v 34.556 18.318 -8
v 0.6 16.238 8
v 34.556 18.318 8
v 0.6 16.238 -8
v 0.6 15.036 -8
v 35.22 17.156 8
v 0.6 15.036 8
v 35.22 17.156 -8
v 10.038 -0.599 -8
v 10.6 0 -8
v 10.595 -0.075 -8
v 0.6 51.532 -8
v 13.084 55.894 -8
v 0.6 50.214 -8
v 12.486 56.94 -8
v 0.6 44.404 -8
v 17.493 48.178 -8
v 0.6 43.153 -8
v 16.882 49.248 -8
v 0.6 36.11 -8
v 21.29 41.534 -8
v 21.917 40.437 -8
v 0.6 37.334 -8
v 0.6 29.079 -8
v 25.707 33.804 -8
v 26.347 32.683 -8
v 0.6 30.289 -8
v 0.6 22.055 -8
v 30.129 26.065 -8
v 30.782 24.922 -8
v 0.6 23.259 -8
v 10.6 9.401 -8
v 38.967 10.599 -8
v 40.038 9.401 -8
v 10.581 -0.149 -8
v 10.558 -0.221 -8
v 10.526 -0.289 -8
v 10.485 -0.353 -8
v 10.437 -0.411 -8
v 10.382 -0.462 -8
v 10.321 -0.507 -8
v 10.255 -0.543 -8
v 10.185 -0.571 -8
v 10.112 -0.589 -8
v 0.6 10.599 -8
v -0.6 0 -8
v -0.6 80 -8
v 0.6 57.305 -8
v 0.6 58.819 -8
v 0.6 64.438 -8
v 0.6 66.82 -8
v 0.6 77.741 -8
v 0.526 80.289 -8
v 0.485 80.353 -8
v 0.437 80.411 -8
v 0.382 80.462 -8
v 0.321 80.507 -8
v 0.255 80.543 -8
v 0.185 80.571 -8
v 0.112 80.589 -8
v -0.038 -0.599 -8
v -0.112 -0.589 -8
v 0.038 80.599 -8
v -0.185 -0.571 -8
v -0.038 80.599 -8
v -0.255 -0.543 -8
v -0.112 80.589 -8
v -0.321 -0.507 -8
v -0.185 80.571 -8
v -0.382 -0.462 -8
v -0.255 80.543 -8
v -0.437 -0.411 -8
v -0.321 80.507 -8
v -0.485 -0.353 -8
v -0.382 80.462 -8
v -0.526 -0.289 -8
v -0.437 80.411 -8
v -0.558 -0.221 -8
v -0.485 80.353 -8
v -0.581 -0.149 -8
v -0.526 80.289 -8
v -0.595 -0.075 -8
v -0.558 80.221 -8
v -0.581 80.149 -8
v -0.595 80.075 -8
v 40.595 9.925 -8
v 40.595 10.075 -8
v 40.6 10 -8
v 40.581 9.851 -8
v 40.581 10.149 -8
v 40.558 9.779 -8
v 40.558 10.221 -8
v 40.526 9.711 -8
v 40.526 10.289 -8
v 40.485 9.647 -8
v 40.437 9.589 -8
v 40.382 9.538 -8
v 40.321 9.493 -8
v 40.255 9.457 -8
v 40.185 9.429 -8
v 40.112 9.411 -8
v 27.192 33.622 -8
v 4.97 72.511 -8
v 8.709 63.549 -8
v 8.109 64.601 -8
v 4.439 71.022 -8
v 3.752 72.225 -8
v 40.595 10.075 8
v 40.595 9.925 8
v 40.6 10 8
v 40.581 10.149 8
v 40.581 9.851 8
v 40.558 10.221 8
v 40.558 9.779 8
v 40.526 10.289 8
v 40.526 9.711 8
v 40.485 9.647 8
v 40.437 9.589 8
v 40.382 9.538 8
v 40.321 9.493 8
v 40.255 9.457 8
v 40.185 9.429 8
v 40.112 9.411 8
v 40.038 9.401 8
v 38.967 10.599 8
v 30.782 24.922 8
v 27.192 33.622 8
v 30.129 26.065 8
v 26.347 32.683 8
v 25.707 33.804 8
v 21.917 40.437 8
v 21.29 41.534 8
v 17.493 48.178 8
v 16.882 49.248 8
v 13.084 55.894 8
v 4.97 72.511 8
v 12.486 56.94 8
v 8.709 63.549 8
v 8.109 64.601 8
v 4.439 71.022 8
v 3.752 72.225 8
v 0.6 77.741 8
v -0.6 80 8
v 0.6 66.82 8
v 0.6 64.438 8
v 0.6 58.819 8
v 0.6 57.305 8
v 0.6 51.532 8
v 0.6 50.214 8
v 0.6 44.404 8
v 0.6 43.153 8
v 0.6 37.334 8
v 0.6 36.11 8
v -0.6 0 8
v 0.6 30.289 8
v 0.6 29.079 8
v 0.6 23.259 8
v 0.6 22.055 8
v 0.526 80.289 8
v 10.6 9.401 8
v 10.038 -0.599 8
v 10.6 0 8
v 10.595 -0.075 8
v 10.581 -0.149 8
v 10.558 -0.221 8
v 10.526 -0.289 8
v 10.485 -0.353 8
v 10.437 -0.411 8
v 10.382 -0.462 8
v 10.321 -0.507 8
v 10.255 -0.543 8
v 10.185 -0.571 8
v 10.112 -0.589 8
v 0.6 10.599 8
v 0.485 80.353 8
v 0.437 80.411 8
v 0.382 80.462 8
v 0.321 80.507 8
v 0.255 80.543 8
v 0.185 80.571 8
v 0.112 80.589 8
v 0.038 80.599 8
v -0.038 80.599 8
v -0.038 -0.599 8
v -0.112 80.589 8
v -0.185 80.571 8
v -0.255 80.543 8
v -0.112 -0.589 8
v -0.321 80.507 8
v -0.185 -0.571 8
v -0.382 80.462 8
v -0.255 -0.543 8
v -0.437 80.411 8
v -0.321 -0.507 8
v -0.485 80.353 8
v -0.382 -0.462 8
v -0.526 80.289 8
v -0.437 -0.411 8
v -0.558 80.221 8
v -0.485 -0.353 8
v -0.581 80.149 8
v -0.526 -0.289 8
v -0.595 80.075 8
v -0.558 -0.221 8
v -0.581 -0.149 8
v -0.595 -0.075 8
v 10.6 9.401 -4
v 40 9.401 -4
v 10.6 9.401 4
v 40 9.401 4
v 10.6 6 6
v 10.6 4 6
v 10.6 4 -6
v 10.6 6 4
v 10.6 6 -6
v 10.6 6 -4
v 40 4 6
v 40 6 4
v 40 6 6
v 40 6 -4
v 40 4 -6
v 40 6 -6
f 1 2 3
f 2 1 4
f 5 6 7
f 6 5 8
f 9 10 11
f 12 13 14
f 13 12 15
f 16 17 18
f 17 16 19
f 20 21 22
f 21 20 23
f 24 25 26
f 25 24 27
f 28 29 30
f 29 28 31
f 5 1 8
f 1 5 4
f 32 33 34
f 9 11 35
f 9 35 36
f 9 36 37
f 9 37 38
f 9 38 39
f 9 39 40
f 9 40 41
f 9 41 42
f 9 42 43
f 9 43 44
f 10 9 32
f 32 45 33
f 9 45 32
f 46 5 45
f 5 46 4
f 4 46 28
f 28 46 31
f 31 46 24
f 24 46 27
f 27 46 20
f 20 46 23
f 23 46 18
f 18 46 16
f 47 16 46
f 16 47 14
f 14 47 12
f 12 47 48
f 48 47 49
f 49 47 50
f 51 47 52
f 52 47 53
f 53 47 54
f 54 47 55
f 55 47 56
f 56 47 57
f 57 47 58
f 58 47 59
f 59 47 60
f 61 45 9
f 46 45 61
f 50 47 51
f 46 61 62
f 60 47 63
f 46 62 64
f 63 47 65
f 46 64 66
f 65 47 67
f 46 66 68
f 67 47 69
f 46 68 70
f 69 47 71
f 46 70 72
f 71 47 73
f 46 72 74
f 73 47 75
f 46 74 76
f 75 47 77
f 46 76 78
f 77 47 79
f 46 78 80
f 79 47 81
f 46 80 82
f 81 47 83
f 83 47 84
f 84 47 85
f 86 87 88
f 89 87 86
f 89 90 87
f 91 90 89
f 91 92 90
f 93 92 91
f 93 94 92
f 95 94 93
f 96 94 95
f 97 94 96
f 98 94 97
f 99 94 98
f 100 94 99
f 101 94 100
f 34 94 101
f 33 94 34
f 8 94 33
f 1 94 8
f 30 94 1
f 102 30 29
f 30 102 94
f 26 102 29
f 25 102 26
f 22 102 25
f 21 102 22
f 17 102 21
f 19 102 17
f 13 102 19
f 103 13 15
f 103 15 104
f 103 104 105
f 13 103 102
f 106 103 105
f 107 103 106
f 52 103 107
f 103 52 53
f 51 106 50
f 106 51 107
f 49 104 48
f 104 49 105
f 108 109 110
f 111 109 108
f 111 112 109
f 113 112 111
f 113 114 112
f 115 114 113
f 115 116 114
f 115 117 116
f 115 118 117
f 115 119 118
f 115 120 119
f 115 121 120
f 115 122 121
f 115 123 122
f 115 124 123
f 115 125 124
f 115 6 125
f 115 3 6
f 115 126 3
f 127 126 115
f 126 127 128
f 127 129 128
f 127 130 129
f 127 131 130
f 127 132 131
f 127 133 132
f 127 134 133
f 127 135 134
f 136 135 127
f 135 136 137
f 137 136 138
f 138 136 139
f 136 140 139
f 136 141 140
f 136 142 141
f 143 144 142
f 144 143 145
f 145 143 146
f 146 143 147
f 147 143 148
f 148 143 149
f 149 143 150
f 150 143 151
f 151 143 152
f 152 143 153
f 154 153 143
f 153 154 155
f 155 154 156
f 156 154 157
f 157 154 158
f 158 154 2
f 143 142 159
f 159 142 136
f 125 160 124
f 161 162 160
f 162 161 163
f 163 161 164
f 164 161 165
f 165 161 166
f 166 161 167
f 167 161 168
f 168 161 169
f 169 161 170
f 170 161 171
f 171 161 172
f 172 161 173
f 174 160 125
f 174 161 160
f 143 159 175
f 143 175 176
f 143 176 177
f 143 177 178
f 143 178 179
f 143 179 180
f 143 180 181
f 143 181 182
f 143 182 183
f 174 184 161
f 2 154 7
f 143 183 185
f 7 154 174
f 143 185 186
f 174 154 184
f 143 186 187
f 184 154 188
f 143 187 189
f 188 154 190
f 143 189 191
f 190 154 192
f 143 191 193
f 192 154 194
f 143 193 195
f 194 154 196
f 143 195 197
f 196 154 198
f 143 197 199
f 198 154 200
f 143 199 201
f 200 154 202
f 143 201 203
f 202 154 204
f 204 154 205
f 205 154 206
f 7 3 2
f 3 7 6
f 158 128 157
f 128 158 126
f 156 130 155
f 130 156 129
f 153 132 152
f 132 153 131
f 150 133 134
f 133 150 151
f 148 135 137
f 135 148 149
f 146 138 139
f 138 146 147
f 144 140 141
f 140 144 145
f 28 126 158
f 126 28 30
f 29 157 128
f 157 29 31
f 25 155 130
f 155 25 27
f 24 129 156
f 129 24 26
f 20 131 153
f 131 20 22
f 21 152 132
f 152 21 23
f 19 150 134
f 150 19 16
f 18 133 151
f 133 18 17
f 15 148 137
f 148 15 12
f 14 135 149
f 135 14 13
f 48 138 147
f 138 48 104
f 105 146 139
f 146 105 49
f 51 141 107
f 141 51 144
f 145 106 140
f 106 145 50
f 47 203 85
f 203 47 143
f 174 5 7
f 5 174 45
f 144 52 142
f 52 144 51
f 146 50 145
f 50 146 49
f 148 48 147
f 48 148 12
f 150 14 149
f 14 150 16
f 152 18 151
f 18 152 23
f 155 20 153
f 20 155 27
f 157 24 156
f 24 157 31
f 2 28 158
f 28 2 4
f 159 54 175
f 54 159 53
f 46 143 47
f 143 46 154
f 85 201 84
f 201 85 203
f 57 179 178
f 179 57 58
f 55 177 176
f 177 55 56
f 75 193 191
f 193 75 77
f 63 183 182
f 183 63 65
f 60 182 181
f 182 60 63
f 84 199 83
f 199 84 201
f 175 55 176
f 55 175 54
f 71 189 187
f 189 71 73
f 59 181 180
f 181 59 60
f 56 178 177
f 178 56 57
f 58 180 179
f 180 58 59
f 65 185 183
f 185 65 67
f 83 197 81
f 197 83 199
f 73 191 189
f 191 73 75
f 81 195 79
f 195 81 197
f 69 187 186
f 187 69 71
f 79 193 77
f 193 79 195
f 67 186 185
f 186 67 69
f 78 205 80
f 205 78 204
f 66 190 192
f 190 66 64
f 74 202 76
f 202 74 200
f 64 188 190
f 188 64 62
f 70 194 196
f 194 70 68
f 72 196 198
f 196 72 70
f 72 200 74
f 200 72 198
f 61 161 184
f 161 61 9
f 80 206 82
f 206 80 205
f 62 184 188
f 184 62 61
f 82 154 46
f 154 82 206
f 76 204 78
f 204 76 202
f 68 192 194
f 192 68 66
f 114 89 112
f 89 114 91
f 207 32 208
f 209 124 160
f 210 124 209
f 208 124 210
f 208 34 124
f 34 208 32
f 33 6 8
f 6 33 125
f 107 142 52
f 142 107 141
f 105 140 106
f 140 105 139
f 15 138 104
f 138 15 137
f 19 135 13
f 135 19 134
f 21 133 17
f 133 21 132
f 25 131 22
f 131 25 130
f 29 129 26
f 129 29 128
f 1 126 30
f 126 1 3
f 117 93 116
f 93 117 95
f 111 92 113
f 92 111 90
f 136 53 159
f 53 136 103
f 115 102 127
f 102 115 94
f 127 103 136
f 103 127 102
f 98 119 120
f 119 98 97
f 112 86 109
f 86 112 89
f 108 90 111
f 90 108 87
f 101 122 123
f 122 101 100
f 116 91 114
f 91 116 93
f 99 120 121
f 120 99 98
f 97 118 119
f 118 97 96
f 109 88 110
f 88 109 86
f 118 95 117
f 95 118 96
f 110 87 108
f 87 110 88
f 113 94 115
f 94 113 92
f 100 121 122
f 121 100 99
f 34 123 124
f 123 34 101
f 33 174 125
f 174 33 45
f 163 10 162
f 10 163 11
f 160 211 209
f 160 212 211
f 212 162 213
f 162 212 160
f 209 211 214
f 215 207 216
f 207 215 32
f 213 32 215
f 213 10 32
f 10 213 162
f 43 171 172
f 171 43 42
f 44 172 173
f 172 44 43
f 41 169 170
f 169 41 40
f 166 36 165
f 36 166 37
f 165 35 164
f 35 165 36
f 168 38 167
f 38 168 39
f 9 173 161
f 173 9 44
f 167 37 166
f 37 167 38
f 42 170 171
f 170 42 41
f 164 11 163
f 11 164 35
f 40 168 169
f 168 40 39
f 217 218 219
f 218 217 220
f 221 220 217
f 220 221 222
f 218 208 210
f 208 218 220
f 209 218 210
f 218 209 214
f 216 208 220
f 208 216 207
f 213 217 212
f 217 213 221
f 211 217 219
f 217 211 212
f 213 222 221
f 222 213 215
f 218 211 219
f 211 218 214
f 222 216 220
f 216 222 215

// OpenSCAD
/* finray_finger.scad
 *
 * (c) 2022 fnh, hendrich@informatik.uni-hamburg.de
 */
 
fn = 50;
eps = 0.1;

translate( [0,0,-8] ) 
finray_finger();

function interpolate( p1, p2, alpha ) =
  alpha*p1 + (1-alpha)*p2;
 
module finray_finger(
  h = 80, d = 40, t = 16, r = 0.6,
  h2 = 10, d2 = 10,
  dovetail = [6, 30, 12, 2 ]
)
{
  // main finray-triangle
  top = [0,h,0];
  front1 = [0,h2,0];
  back1  = [d,h2,0];
  origin = [0,0,0];
  
  hull() {
    translate( top ) cylinder( r=r, h=t, center=false, $fn=fn );
    translate( origin ) cylinder( r=r, h=t, center=false, $fn=fn );
  }
  hull() {
    translate( top ) cylinder( r=r, h=t, center=false, $fn=fn );
    translate( back1 ) cylinder( r=r, h=t, center=false, $fn=fn );
  }
  hull() {
    translate( front1 ) cylinder( r=r, h=t, center=false, $fn=fn );
    translate( back1 ) cylinder( r=r, h=t, center=false, $fn=fn );
  }
  
  imax = 9;
  for( i=[1:imax] ) {
    alpha = -0.02 + 0.9*i/imax;
    beta = 1.0*i/imax;
    hull() {
      translate( interpolate( top, front1, alpha )) cylinder( r=r, h=t, center=false, $fn=fn );   
      translate( interpolate( top, back1, beta )) cylinder( r=r, h=t, center=false, $fn=fn );   
    }
  }
  
  // bottom front part
  hull() {
    translate( origin ) cylinder( r=r, h=t, center=false, $fn=fn );
    translate( front1 ) cylinder( r=r, h=t, center=false, $fn=fn );
    translate( [d2,h2,0] ) cylinder( r=r, h=t, center=false, $fn=fn );
    translate( [d2,0,0] ) cylinder( r=r, h=t, center=false, $fn=fn );
  }

  // dovetail: [height,depth,thickness,inset] 
  hd = dovetail[0];
  dd = dovetail[1];
  td = dovetail[2];
  xx = dovetail[3];
  translate( [d2+dd/2,h2-hd/2, t/2] )
    cube( [dd,hd,td-2*xx], center=true );
  translate( [d2+dd/2, h2-hd+xx/2, t/2] )
    cube( [dd,xx,td], center=true );
}
